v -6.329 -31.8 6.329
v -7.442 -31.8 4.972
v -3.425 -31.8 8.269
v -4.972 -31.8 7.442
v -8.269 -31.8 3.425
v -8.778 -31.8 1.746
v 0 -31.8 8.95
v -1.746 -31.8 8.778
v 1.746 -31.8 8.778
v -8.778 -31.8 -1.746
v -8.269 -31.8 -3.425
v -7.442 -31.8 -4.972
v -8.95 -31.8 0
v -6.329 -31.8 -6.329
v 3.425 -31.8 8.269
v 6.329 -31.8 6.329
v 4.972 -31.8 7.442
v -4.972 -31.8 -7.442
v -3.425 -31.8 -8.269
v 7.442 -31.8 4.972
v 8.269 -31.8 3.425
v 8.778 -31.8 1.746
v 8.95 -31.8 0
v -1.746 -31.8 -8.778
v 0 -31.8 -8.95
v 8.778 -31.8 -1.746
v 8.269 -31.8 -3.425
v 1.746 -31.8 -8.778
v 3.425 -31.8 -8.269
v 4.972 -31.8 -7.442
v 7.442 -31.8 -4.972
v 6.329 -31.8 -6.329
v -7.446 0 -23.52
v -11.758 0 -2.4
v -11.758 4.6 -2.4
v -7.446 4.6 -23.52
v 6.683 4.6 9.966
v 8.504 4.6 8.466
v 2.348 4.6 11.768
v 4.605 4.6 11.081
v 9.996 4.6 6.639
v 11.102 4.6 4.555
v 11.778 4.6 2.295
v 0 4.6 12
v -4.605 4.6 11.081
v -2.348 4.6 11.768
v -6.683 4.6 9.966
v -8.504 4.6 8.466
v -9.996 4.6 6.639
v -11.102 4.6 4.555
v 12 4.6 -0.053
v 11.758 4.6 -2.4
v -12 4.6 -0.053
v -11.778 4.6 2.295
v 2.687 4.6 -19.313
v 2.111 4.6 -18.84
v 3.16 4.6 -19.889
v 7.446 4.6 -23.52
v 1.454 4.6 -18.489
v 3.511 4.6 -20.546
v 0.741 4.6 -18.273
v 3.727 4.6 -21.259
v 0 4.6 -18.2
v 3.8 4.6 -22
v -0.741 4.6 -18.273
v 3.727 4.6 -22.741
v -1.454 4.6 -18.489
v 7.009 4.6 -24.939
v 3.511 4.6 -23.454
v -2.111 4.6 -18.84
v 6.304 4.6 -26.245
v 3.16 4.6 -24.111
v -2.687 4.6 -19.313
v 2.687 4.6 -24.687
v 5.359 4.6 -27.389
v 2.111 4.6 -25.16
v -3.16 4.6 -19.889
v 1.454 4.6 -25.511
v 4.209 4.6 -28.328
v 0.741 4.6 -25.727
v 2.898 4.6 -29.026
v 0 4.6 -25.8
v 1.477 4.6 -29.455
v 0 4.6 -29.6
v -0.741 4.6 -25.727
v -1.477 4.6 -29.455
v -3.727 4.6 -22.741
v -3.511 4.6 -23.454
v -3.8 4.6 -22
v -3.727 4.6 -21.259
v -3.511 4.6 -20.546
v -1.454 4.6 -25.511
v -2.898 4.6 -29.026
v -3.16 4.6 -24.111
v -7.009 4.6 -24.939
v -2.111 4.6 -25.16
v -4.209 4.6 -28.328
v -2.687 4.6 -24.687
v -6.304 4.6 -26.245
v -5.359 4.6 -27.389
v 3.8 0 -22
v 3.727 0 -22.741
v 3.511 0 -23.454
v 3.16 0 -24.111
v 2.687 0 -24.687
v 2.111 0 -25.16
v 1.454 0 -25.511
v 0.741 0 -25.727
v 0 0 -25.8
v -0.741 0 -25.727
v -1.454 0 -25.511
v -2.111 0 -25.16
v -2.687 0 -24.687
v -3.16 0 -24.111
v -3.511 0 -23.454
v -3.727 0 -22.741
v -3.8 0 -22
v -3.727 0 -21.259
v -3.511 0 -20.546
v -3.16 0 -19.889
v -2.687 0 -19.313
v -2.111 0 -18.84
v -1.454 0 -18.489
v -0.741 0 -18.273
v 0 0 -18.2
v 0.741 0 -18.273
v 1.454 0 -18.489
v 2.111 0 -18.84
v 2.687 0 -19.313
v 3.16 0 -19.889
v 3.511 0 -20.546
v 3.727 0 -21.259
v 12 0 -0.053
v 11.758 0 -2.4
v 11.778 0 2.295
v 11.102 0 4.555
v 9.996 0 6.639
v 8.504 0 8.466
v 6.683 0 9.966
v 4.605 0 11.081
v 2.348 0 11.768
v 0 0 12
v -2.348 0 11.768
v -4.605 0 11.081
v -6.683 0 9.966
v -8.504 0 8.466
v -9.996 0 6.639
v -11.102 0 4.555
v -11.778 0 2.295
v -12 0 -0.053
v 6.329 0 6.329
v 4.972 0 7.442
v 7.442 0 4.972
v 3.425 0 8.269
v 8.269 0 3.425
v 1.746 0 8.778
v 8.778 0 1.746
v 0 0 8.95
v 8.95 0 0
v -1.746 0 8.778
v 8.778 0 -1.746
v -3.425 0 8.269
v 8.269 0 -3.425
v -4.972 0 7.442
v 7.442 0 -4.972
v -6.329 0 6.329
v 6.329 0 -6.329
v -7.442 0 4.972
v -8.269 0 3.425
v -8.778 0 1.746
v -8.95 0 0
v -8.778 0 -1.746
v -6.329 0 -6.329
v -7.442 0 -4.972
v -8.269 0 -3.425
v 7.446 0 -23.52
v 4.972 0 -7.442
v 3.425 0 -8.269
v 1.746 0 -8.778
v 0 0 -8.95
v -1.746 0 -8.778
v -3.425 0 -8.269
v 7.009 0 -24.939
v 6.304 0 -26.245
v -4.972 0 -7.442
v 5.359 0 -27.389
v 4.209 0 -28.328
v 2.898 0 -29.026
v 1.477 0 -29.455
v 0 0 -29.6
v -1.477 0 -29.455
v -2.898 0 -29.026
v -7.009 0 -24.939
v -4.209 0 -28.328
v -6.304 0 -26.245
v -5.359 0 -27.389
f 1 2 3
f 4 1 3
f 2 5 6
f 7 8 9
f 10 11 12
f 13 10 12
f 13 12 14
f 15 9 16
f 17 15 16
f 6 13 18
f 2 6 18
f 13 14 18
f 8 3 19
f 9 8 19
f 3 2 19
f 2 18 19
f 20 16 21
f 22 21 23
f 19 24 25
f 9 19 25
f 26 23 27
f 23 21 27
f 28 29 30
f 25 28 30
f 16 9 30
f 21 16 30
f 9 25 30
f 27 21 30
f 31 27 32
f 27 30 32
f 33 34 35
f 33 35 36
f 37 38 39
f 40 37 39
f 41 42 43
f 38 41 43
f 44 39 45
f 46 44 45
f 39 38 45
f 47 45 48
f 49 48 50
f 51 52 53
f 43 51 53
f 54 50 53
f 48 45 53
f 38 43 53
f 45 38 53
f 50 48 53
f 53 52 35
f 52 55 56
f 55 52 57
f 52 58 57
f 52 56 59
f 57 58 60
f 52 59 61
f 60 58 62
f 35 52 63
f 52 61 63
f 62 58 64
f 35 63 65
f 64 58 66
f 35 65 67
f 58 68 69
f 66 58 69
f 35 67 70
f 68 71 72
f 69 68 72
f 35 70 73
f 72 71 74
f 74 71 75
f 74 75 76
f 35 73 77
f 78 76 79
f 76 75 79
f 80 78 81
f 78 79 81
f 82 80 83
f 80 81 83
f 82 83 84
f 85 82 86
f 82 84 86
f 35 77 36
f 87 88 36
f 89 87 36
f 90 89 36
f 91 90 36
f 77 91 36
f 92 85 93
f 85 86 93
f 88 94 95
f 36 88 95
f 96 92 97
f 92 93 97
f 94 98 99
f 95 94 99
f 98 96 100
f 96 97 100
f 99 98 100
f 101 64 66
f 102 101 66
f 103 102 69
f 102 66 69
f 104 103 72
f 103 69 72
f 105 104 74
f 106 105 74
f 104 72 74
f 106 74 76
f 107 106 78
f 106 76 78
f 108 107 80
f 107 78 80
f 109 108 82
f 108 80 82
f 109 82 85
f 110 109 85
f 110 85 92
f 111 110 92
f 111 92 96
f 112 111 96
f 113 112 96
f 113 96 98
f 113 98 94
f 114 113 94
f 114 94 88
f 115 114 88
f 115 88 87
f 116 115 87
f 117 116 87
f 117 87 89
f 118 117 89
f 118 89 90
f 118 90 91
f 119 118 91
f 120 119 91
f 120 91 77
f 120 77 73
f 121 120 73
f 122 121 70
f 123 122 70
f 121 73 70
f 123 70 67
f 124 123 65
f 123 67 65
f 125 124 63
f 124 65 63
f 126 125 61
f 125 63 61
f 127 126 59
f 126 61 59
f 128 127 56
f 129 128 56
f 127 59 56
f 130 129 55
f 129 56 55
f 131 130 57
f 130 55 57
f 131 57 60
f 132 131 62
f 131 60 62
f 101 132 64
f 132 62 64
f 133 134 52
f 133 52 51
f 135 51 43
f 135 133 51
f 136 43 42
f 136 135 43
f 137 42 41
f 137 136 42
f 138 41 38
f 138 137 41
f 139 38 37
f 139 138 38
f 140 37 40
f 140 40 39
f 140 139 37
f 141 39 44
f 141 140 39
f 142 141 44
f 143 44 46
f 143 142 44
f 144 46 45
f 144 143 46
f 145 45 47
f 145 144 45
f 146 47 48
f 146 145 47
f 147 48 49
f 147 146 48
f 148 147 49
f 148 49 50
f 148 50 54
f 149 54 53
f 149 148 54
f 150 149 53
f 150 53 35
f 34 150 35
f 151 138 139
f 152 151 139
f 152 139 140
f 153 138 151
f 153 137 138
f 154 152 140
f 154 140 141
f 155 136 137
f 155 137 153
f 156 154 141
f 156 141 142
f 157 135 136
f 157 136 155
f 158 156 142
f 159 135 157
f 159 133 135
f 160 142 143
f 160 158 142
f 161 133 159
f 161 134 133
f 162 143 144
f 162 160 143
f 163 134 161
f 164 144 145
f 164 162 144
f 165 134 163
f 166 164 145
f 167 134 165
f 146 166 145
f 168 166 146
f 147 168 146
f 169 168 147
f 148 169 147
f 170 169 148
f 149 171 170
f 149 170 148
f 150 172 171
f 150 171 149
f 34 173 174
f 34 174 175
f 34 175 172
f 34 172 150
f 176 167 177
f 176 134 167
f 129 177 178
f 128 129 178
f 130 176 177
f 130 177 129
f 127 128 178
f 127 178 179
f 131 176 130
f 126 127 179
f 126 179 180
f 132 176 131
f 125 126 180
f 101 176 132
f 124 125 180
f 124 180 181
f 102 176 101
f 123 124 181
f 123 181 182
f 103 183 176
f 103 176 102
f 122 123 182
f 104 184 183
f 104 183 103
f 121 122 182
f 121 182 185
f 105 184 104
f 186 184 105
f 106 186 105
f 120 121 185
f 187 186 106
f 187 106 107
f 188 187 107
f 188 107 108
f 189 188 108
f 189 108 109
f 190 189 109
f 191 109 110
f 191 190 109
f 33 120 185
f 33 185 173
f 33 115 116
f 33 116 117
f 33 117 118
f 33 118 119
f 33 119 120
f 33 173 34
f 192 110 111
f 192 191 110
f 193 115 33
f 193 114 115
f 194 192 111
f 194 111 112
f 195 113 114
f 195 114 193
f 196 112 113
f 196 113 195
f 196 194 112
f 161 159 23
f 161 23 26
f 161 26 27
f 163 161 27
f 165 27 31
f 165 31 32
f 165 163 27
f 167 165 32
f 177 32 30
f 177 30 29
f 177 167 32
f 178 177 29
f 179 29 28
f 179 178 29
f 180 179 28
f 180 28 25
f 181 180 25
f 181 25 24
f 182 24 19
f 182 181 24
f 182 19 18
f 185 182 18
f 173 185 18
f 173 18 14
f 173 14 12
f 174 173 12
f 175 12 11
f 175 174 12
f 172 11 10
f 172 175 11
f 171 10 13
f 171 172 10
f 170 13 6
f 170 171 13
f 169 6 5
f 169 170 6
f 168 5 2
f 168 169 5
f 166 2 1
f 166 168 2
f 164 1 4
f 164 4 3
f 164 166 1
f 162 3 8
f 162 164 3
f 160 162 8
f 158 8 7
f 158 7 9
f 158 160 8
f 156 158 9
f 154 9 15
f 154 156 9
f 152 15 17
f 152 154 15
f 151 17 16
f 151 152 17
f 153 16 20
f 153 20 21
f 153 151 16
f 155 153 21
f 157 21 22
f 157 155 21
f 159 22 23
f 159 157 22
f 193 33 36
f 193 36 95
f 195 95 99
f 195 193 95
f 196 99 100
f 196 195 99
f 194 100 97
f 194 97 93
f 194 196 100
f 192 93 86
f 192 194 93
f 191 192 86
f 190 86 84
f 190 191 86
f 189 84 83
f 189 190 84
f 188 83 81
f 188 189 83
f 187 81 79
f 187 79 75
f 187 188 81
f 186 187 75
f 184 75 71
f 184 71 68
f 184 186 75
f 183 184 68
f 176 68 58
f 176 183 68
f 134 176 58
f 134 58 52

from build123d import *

# Parameters (mm, degrees)
BASE_DEPTH               = 4.6
SKETCH4_R                = 8.95
SENSOR_DEPTH             = 31.8
BOLT_HOLE_M7_CLEARANCE_D = 7.6


with BuildPart() as part:
    # Sketch1 → Base (new body)
    with BuildSketch(Plane(origin=(0, 0, 0), x_dir=(1, 0, 0), z_dir=(0, 1, 0))):
        with BuildLine():
            Line((-11.757550765, 2.4), (-7.446448818, 23.52))
            ThreePointArc((-7.446448818, 23.52), (0, 29.6), (7.446448818, 23.52))
            Line((7.446448818, 23.52), (11.757550765, 2.4))
            ThreePointArc((11.757550765, 2.4), (0, -12), (-11.757550765, 2.4))
        make_face()
    extrude(amount=BASE_DEPTH)

    # Sketch4 → Sensor (add)
    with BuildSketch(Plane(origin=(0, 0, 0), x_dir=(1, 0, 0), z_dir=(0, 1, 0))):
        Circle(SKETCH4_R)
    extrude(amount=-SENSOR_DEPTH)

    # Bolt Hole (M7 Clearance) (through all)
    with Locations(Plane(origin=(0, 0, 0), x_dir=(-1, 0, 0), z_dir=(0, -1, 0))):
        with Locations((0, 22)):
            Hole(BOLT_HOLE_M7_CLEARANCE_D / 2)


solid = part.part
